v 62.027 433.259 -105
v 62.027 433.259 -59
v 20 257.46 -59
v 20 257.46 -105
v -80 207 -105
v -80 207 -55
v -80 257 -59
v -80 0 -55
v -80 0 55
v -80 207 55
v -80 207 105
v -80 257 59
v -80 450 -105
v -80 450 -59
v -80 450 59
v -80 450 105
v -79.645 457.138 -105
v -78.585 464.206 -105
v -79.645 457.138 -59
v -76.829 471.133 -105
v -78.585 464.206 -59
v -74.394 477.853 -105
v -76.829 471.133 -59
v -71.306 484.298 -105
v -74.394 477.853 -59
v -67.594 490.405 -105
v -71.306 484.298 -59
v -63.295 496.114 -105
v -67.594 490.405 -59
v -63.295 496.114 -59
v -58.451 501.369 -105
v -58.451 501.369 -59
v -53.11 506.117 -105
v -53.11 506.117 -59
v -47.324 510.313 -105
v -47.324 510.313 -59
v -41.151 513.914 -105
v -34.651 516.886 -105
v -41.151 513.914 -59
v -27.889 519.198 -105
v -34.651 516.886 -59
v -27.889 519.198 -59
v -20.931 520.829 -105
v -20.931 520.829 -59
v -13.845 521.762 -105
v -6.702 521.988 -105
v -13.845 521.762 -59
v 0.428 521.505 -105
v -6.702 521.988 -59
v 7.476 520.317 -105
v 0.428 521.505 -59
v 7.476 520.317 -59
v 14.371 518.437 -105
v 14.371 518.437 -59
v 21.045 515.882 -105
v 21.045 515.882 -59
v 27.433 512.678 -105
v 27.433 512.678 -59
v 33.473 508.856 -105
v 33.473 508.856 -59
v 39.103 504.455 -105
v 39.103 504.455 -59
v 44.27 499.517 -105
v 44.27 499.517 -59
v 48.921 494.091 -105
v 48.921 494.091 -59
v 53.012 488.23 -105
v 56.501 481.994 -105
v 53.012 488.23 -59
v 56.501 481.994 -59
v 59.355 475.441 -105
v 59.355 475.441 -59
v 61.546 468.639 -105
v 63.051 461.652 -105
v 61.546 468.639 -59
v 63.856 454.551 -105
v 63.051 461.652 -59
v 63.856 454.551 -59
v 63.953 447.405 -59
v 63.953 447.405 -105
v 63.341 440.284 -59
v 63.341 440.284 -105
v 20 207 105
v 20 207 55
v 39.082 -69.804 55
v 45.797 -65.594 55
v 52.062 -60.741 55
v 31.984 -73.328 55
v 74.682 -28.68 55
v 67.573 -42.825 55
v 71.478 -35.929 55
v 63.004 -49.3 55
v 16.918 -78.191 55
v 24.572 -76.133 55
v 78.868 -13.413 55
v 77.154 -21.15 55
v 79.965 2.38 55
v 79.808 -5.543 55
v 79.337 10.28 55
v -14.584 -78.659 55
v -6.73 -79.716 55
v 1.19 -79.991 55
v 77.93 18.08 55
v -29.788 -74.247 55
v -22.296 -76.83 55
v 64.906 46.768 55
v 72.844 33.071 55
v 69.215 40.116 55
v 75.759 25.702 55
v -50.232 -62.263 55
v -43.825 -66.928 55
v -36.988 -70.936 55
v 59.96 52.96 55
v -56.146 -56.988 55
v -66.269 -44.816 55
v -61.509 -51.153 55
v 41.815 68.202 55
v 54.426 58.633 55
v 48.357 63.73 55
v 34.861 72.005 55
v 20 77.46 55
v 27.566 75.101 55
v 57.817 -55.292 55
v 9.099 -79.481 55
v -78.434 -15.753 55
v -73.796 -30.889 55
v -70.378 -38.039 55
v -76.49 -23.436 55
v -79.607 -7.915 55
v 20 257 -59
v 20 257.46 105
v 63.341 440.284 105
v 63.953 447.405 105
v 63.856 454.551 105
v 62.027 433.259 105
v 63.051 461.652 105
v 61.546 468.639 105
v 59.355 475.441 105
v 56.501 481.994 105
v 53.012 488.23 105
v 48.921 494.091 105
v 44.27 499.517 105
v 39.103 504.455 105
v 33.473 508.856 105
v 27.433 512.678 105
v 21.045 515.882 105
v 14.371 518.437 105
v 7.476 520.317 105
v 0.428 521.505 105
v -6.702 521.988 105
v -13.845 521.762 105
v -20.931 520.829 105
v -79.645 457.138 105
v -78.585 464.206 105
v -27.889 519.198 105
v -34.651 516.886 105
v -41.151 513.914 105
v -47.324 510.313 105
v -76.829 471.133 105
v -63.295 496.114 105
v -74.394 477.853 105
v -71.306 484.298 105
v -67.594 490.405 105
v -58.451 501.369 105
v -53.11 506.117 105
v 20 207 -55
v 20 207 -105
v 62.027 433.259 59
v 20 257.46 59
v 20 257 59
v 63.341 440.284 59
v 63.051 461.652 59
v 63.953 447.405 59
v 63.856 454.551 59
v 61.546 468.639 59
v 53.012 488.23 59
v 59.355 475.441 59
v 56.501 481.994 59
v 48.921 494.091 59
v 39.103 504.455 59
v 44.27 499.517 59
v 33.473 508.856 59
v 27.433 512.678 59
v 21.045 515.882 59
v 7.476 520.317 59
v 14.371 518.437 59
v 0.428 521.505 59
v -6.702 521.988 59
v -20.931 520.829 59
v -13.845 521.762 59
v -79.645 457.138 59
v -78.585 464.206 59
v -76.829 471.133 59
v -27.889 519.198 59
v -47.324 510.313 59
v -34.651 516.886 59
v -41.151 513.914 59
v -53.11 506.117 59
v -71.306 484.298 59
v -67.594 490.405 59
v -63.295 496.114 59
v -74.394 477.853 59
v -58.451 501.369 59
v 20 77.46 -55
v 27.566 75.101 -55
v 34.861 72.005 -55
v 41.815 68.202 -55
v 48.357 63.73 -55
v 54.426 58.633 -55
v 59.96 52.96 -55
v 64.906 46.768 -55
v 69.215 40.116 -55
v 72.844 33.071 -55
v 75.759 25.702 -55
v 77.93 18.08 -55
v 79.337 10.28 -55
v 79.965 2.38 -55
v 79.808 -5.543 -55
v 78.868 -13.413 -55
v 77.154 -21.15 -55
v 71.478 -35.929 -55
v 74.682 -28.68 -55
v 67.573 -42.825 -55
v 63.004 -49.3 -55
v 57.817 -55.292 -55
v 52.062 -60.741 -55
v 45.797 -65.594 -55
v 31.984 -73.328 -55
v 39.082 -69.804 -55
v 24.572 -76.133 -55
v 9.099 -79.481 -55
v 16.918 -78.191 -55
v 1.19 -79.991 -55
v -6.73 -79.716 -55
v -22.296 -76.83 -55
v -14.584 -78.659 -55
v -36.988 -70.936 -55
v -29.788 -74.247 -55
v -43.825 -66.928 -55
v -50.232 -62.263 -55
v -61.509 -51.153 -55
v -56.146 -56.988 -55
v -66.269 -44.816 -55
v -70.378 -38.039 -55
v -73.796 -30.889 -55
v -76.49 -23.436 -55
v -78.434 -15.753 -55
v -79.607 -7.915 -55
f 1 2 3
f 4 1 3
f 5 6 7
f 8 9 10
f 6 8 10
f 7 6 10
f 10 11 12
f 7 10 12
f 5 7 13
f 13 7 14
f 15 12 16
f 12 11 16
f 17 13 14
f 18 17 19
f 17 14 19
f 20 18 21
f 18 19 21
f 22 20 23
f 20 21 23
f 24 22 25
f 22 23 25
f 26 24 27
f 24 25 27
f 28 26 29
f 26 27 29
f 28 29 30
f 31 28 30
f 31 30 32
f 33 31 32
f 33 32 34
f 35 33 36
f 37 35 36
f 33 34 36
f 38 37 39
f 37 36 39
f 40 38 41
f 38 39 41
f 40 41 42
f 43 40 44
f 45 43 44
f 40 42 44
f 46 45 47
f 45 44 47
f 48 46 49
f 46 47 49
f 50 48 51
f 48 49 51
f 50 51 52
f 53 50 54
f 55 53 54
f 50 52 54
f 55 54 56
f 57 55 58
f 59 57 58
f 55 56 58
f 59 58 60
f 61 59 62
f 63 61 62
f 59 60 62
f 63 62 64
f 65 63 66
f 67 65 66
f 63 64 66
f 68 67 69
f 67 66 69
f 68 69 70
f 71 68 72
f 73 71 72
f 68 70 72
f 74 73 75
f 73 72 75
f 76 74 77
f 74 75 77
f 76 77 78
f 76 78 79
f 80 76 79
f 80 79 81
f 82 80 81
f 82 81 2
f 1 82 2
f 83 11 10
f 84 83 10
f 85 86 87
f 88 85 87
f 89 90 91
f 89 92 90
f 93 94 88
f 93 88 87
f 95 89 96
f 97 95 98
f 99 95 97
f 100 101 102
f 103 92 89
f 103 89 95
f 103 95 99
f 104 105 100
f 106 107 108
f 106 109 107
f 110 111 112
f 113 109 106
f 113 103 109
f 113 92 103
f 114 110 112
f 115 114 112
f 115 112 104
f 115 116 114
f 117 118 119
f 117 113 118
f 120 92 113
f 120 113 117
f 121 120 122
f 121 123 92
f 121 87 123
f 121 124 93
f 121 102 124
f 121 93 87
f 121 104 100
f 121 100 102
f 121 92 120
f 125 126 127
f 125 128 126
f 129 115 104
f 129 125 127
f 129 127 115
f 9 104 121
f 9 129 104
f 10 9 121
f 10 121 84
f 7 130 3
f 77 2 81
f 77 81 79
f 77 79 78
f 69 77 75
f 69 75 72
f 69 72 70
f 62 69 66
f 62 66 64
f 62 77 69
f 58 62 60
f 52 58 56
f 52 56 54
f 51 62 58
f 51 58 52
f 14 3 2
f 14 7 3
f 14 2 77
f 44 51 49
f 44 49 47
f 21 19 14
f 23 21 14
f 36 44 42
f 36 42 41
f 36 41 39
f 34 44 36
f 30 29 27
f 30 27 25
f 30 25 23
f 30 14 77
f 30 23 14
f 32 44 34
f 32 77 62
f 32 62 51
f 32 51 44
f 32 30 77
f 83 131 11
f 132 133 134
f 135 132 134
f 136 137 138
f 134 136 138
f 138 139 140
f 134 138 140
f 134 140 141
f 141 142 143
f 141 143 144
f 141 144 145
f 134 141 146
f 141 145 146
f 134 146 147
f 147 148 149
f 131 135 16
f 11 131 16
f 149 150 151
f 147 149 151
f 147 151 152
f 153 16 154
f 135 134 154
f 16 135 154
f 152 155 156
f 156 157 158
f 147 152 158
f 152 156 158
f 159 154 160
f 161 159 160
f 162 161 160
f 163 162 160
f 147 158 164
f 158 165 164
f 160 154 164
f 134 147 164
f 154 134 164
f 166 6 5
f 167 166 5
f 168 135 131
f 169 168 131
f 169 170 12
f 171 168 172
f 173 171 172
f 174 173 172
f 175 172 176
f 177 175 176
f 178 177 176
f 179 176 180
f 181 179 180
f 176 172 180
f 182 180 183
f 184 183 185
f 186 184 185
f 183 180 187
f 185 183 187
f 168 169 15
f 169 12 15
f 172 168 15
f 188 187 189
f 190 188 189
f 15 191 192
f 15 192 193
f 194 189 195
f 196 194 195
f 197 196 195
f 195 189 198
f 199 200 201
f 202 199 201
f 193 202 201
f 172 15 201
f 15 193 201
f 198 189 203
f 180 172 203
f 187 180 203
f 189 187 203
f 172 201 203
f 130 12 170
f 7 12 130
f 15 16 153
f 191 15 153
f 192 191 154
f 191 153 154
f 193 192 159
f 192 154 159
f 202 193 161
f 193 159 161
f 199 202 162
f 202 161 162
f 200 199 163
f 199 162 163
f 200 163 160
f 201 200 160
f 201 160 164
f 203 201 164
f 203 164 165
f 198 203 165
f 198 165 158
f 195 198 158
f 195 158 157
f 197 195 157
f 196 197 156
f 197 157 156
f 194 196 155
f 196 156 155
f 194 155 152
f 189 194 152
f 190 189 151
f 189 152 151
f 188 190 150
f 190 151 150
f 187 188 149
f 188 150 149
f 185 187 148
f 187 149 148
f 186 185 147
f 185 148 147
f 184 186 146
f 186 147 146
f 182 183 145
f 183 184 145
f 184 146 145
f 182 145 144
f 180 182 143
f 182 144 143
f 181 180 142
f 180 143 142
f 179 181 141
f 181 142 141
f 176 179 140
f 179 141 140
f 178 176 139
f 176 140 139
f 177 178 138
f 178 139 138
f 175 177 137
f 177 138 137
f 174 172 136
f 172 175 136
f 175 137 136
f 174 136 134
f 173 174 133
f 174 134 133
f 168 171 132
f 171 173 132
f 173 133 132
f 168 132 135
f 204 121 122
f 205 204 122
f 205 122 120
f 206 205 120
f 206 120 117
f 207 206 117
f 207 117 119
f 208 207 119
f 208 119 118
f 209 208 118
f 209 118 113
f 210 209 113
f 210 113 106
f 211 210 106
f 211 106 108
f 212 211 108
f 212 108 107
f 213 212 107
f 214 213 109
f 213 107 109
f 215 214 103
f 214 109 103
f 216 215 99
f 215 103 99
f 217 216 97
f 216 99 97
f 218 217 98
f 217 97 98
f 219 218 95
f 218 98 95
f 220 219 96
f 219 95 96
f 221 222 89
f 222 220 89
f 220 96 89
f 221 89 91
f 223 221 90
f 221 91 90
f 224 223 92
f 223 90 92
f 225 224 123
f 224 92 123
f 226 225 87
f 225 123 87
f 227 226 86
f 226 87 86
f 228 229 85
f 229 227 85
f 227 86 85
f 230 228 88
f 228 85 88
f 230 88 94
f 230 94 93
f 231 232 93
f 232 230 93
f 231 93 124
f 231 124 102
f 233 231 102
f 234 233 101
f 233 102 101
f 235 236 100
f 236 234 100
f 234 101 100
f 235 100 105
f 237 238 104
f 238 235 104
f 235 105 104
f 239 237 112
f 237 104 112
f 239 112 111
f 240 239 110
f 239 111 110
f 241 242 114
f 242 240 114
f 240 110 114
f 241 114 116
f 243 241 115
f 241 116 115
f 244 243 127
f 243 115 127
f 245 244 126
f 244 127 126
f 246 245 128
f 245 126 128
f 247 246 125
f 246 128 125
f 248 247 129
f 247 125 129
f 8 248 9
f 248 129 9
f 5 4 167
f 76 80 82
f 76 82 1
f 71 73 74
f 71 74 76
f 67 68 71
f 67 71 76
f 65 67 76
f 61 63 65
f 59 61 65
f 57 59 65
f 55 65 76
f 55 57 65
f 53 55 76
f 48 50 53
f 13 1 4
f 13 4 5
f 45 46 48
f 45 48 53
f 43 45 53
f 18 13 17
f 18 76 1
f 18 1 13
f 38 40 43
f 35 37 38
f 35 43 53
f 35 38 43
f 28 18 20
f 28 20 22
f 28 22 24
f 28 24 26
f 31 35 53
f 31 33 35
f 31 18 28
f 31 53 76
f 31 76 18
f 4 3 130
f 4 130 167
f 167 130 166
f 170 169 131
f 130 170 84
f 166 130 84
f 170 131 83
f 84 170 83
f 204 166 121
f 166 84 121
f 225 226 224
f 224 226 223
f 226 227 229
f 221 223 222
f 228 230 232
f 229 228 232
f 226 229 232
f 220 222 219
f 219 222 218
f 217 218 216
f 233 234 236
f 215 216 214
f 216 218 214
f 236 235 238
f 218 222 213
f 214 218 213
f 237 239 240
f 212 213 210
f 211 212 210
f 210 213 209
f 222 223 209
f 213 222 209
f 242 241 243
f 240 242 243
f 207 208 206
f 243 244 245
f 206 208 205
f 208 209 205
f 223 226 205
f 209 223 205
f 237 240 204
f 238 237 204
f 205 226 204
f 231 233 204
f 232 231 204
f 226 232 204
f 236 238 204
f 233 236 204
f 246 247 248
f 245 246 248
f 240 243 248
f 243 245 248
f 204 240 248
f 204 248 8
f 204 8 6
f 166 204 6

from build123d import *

# Parameters (mm, degrees)
BOSS_EXTRUDE1_DEPTH     = 105
CUT_EXTRUDE1_DEPTH      = 539.431982705
CUT_EXTRUDE1_DEPTH_BACK = 539.431982705
SKETCH2_W               = 118
SKETCH2_H               = 265
SKETCH2_W_2             = 50
SKETCH2_H_2             = 287


with BuildPart() as part:
    # Sketch1 → Boss-Extrude1 (new, symmetric)
    with BuildSketch(Plane.XY):
        with BuildLine():
            Line((-80, 0), (-80, 450))
            ThreePointArc((-80, 450), (0.428269124, 521.504994788), (62.026785544, 433.259351673))
            Line((62.026785544, 433.259351673), (20, 257.459666924))
            Line((20, 257.459666924), (20, 77.459666924))
            ThreePointArc((20, 77.459666924), (48.989794856, -63.245553203), (-80, 0))
        make_face()
    extrude(amount=BOSS_EXTRUDE1_DEPTH, both=True)

    # Sketch2 → Cut-Extrude1 (cut, two sides: drawn at the far end of the back side and taken through both)
    with BuildSketch(Plane(origin=(0, 0, 0), x_dir=(0, 0, -1), z_dir=(1, 0, 0)).offset(-CUT_EXTRUDE1_DEPTH_BACK)):
        with Locations((0, 389.5)):
            Rectangle(SKETCH2_W, SKETCH2_H)
        with Locations((-80, 63.5)):
            Rectangle(SKETCH2_W_2, SKETCH2_H_2)
        with Locations((80, 63.5)):
            Rectangle(SKETCH2_W_2, SKETCH2_H_2)
    extrude(amount=CUT_EXTRUDE1_DEPTH + CUT_EXTRUDE1_DEPTH_BACK, mode=Mode.SUBTRACT)


solid = part.part
